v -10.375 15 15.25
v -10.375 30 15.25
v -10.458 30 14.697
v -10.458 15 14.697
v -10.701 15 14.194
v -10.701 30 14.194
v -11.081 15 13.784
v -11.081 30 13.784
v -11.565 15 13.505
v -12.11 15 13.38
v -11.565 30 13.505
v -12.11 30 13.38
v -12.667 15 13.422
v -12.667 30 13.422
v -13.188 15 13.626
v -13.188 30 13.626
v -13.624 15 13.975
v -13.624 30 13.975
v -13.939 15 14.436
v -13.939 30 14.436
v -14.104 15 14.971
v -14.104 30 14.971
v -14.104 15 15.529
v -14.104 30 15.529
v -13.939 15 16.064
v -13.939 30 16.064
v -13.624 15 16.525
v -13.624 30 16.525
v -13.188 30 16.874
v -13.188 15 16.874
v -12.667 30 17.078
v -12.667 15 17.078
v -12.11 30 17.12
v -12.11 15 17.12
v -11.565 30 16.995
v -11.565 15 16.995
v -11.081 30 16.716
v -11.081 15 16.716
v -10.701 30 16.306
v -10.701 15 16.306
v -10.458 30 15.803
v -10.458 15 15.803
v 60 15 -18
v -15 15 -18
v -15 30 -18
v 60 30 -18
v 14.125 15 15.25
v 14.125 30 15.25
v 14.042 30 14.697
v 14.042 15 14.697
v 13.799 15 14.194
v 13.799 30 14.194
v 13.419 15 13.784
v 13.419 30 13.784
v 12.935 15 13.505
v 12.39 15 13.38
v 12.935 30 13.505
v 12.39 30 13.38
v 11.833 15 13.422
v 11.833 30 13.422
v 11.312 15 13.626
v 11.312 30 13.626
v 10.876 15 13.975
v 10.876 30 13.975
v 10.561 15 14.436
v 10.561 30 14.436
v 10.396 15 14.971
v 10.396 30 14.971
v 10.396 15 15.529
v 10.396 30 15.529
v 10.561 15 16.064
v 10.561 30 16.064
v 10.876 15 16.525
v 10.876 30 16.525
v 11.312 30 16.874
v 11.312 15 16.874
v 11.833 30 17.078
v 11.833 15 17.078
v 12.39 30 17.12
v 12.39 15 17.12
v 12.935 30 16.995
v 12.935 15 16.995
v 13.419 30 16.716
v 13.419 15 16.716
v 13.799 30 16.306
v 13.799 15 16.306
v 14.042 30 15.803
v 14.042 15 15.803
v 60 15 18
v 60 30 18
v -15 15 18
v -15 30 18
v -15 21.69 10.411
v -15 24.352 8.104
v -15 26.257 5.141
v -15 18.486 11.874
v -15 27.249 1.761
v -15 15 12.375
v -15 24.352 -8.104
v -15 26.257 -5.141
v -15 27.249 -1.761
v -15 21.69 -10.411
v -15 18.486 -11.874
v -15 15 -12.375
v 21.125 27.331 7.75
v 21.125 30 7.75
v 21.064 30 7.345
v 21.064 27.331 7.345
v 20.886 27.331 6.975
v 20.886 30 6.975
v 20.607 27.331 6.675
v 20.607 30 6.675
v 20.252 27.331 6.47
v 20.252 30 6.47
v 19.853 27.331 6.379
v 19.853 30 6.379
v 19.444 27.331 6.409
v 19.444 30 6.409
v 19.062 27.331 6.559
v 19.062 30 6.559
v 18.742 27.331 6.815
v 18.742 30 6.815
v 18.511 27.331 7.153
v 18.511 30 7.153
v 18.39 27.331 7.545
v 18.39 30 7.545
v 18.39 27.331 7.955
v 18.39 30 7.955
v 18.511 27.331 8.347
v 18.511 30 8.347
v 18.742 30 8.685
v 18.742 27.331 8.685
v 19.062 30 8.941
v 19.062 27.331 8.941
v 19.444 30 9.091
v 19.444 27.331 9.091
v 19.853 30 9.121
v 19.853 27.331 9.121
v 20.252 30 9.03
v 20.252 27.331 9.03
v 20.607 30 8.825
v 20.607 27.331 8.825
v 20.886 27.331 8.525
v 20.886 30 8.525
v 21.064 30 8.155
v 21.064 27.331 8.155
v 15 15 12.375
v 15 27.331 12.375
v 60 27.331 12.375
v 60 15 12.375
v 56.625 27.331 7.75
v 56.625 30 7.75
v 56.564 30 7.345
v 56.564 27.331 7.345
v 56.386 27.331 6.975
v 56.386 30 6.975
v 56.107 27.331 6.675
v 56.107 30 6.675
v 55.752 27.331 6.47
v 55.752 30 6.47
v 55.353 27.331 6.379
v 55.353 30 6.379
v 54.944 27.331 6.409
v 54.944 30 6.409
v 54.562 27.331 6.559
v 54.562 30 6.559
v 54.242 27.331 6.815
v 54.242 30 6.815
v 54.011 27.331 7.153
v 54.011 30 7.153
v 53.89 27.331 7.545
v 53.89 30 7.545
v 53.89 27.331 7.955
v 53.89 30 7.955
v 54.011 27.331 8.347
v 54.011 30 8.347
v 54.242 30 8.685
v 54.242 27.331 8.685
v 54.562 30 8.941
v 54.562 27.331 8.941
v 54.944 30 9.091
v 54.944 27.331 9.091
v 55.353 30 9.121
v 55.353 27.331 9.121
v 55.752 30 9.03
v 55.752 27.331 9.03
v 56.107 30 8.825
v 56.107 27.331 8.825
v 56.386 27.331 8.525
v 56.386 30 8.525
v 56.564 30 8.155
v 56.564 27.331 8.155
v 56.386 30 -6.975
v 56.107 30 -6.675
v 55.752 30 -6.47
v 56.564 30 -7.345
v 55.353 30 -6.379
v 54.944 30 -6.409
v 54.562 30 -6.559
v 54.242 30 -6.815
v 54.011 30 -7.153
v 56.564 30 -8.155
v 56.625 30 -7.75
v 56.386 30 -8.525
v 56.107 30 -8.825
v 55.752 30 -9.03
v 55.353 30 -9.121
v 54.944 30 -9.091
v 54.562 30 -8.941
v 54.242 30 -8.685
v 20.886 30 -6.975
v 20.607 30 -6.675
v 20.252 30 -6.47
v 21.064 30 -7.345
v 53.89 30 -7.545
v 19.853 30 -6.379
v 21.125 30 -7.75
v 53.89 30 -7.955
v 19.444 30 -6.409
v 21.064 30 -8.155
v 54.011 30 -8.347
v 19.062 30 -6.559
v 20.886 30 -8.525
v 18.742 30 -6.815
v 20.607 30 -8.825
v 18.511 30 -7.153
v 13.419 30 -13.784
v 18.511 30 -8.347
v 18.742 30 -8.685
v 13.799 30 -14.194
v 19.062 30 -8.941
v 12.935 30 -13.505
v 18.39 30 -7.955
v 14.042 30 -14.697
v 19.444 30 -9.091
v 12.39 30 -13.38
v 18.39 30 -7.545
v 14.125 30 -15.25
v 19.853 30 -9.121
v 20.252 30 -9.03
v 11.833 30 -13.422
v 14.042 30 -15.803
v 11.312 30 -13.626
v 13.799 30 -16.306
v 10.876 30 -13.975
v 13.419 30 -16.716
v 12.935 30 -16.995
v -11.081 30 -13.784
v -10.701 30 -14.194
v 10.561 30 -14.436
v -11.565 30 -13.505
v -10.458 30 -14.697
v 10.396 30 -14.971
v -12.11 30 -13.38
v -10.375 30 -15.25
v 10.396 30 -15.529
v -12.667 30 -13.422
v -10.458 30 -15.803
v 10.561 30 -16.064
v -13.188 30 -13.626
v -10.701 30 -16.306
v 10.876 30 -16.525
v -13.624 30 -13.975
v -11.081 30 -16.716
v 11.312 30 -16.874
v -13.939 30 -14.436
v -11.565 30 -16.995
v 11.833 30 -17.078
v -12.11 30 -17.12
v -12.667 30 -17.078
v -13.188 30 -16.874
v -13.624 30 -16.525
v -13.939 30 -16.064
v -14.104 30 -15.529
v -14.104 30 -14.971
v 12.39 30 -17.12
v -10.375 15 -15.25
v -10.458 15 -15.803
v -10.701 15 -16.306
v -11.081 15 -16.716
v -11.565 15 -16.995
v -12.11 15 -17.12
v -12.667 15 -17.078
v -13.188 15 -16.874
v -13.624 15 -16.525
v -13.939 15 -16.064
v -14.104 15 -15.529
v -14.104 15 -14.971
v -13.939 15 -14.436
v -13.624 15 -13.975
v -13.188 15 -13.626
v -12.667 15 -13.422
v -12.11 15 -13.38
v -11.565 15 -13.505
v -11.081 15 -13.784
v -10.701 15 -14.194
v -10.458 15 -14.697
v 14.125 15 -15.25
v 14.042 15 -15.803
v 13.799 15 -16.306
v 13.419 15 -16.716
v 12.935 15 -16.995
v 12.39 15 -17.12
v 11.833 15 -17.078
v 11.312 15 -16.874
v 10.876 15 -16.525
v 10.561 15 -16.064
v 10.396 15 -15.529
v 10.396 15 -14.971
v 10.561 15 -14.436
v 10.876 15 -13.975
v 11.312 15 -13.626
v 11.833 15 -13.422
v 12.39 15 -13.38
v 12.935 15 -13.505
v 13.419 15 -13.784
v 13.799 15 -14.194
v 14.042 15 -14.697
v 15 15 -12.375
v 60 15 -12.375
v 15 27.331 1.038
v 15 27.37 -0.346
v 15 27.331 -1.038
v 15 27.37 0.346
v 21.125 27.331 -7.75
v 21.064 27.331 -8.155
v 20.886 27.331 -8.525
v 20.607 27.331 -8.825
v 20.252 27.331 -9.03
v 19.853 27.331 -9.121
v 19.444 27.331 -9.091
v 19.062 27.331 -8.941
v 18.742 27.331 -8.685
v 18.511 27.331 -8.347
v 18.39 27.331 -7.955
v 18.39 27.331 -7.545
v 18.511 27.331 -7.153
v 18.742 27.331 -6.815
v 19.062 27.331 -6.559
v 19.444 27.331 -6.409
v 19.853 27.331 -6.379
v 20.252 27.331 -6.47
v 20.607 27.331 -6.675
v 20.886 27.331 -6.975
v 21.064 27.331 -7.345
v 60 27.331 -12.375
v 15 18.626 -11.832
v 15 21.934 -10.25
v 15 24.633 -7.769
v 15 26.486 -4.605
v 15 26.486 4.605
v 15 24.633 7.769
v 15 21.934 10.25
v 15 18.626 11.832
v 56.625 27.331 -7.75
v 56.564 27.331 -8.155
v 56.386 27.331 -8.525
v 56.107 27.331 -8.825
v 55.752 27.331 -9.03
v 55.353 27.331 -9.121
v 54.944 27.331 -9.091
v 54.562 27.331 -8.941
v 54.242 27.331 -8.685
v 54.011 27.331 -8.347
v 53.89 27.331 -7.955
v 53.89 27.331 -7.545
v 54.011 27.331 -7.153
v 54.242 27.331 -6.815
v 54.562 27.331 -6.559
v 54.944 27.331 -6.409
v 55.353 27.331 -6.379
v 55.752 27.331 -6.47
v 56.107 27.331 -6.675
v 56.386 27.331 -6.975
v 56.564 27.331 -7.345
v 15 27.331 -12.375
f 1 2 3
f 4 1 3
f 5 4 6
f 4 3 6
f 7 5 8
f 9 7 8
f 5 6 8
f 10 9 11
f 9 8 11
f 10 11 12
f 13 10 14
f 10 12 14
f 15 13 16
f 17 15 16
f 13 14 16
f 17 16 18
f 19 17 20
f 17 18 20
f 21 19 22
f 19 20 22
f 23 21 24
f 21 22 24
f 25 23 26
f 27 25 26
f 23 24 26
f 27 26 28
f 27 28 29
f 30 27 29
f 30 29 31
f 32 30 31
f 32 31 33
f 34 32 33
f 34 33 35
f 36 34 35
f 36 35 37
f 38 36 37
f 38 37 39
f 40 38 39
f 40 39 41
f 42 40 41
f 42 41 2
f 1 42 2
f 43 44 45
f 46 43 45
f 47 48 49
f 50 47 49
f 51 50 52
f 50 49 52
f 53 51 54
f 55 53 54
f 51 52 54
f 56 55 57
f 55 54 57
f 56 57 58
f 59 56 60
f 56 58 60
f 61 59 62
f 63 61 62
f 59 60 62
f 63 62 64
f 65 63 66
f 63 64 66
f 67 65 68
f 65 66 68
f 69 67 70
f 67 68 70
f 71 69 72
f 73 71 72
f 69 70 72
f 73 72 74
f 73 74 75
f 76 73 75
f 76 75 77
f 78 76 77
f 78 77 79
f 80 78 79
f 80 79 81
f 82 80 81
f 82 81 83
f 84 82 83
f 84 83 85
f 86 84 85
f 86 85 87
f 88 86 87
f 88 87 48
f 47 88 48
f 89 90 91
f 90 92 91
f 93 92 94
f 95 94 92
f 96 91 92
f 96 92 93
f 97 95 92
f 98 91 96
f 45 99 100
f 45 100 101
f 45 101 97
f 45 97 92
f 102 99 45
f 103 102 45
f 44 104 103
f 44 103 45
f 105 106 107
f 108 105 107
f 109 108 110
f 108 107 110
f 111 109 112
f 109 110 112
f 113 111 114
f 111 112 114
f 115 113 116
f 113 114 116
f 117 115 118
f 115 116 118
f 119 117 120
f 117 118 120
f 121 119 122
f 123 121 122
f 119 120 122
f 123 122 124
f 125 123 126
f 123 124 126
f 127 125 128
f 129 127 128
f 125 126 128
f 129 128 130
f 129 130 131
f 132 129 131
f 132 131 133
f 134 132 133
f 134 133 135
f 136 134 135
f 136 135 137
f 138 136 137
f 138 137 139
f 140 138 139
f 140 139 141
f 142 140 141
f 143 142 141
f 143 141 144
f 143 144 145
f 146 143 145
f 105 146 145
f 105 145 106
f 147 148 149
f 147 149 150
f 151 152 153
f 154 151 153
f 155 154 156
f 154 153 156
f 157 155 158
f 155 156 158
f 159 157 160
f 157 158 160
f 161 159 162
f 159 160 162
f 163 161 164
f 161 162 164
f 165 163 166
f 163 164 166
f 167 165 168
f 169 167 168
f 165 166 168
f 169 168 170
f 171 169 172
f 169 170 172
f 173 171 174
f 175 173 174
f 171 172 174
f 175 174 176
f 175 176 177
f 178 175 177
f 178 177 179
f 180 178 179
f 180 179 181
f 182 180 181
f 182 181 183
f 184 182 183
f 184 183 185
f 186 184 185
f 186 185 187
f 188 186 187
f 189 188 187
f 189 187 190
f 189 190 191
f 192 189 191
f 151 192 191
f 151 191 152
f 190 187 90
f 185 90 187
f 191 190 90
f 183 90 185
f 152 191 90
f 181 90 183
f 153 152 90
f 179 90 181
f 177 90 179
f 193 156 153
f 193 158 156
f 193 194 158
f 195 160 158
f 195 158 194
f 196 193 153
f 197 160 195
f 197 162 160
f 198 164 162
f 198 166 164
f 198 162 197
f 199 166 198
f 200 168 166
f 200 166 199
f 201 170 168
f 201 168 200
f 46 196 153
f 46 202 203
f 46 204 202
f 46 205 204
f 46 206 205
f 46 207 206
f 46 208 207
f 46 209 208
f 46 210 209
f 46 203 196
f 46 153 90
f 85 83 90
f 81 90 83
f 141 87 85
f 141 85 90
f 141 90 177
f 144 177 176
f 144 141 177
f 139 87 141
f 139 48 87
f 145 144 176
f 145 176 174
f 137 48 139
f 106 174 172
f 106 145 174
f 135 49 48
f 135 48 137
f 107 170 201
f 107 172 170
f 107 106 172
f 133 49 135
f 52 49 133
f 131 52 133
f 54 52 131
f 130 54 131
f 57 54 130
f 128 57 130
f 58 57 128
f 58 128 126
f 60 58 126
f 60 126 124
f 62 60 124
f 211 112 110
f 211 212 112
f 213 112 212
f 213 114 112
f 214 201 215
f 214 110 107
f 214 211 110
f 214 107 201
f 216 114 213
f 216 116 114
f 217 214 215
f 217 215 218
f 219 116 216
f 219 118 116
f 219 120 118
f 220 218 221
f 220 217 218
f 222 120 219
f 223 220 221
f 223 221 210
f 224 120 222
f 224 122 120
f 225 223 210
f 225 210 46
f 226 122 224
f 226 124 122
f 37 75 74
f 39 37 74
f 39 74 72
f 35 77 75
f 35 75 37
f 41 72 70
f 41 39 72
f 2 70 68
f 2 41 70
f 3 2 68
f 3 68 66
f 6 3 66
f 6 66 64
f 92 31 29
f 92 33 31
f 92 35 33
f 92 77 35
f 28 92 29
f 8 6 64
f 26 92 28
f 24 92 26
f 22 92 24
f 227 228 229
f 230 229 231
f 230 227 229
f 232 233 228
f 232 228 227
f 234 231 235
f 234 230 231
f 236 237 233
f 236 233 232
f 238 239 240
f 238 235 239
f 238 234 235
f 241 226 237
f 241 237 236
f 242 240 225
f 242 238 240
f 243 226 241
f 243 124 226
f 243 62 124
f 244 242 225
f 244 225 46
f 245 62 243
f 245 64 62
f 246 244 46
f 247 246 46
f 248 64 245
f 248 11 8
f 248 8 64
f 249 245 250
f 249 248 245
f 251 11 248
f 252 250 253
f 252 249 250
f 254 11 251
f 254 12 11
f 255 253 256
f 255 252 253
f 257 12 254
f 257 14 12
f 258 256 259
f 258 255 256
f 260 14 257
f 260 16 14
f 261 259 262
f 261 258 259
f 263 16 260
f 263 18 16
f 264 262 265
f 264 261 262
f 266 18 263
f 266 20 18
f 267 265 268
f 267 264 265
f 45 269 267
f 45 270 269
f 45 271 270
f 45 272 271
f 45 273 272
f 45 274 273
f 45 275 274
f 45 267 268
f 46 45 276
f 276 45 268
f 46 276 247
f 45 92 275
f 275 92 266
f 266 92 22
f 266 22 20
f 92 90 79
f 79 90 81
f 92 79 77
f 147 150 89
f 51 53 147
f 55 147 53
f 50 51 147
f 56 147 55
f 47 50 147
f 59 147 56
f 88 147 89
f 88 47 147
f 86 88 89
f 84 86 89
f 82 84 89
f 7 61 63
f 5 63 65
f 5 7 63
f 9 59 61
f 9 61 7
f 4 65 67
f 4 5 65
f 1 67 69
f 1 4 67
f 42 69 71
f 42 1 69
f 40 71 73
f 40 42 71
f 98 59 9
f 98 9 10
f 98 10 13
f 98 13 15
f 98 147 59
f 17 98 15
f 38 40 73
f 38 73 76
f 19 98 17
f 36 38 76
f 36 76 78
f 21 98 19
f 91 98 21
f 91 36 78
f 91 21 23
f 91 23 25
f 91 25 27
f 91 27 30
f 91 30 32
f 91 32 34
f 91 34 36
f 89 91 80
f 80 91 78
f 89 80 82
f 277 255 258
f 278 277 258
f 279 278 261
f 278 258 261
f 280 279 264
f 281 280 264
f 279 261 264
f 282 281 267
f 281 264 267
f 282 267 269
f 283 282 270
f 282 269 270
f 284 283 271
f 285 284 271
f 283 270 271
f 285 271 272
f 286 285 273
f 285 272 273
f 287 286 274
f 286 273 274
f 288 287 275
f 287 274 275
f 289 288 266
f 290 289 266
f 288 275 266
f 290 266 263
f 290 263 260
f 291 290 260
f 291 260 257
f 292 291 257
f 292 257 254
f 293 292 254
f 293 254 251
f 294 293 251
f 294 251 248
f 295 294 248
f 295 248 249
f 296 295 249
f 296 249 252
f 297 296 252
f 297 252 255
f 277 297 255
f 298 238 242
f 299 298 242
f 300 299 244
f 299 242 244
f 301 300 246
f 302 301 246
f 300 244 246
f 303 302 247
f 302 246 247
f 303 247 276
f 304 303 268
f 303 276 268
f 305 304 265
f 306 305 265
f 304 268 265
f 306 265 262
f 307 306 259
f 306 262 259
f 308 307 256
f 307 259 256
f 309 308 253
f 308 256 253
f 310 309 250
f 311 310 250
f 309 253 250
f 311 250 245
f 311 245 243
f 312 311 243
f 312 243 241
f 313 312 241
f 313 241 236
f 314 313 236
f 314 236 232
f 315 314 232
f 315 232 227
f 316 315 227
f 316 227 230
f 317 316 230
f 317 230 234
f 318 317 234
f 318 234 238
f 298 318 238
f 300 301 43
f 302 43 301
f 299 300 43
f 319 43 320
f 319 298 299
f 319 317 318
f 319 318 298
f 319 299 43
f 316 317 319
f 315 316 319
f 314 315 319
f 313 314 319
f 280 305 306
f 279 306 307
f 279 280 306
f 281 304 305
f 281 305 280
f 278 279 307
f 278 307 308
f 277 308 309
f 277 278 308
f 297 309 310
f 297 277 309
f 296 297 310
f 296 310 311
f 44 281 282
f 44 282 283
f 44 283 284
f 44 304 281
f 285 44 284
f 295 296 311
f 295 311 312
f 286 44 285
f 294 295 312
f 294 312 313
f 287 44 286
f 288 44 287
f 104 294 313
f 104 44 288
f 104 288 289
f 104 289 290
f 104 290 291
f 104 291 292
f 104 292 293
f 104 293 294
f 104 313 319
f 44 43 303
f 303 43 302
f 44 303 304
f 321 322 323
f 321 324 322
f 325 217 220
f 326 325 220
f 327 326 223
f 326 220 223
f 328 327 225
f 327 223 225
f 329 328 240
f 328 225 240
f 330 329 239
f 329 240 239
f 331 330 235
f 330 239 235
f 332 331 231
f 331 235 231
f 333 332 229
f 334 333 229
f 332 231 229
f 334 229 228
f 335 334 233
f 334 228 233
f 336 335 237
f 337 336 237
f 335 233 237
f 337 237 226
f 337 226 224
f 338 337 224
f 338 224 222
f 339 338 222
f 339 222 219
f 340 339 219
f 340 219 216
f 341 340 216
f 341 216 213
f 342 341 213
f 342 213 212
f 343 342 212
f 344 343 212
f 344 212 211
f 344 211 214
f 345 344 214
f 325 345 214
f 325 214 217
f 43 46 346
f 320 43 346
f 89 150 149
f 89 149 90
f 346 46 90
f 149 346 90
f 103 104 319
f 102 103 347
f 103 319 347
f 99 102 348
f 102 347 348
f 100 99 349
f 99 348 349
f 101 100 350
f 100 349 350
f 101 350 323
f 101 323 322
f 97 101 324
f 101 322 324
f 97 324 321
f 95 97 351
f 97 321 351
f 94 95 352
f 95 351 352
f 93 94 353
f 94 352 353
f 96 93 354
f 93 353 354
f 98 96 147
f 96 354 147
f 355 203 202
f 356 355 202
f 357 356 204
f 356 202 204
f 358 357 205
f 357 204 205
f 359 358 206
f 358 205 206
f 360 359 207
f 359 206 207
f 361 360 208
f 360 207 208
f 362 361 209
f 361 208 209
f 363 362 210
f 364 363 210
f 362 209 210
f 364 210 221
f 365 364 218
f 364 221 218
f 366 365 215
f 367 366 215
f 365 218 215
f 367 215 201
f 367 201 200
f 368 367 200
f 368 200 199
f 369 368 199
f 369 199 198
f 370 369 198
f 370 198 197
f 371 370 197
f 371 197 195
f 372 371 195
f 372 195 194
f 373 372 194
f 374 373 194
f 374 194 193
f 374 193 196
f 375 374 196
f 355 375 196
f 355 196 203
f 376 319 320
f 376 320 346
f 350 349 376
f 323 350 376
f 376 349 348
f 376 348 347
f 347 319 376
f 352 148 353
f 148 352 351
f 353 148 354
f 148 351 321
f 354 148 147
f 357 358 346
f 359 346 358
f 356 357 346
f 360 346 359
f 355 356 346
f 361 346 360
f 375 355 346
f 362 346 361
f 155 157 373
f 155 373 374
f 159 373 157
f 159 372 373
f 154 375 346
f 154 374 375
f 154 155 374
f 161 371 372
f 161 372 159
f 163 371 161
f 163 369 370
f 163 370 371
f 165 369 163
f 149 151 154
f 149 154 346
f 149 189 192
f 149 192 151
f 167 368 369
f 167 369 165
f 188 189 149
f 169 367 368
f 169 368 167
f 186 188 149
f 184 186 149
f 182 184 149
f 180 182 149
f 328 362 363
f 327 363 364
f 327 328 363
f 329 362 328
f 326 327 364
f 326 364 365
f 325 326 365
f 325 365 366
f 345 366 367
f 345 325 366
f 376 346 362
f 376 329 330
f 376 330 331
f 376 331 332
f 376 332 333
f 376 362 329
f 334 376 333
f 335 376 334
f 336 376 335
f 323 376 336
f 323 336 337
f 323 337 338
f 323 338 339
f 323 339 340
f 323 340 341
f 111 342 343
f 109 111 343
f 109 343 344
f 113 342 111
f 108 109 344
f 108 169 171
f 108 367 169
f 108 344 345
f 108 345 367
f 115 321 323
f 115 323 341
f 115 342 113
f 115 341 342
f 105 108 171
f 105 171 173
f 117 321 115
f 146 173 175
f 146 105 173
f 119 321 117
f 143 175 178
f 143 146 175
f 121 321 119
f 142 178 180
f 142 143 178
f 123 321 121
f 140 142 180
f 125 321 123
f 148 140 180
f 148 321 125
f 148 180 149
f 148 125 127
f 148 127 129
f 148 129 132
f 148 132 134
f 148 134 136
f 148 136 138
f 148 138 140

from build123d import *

# Parameters (mm, degrees)
SKETCH1_W           = 30
SKETCH1_H           = 36
BOSS_EXTRUDE1_DEPTH = 30
SKETCH3_R           = 12.375
CUT_EXTRUDE1_DEPTH  = 40
SKETCH5_R           = 1.875
CUT_EXTRUDE2_DEPTH  = 40
CUT_EXTRUDE3_START  = 15
SKETCH7_W           = 36
SKETCH7_H           = 15
CUT_EXTRUDE3_DEPTH  = 31
BOSS_EXTRUDE2_DEPTH = 45
SKETCH9_R           = 1.375
CUT_EXTRUDE4_DEPTH  = 10


with BuildPart() as part:
    # Sketch1 → Boss-Extrude1 (new body)
    with BuildSketch(Plane(origin=(0, 0, 0), x_dir=(1, 0, 0), z_dir=(0, 1, 0))):
        Rectangle(SKETCH1_W, SKETCH1_H)
    extrude(amount=BOSS_EXTRUDE1_DEPTH)

    # Sketch3 → Cut-Extrude1 (cut)
    with BuildSketch(Plane(origin=(15, 0, 0), x_dir=(0, 0, -1), z_dir=(1, 0, 0))):
        with Locations((0, 15)):
            Circle(SKETCH3_R)
    extrude(amount=-CUT_EXTRUDE1_DEPTH, mode=Mode.SUBTRACT)

    # Sketch5 → Cut-Extrude2 (cut)
    with BuildSketch(Plane(origin=(0, 30, 0), x_dir=(1, 0, 0), z_dir=(0, 1, 0))):
        with Locations((-12.25, 15.25)):
            Circle(SKETCH5_R)
        with Locations((-12.25, -15.25)):
            Circle(SKETCH5_R)
        with Locations((12.25, -15.25)):
            Circle(SKETCH5_R)
        with Locations((12.25, 15.25)):
            Circle(SKETCH5_R)
    extrude(amount=-CUT_EXTRUDE2_DEPTH, mode=Mode.SUBTRACT)

    # Sketch7 → Cut-Extrude3 (cut, through all)
    with BuildSketch(Plane(origin=(0, 0, 0), x_dir=(0, 0, -1), z_dir=(1, 0, 0)).offset(CUT_EXTRUDE3_START)):
        with Locations((0, 7.5)):
            Rectangle(SKETCH7_W, SKETCH7_H)
    extrude(amount=-CUT_EXTRUDE3_DEPTH, mode=Mode.SUBTRACT)

    # Sketch8 → Boss-Extrude2 (add)
    with BuildSketch(Plane(origin=(15, 0, 0), x_dir=(0, 0, -1), z_dir=(1, 0, 0))):
        Polygon((-18, 30), (18, 30), (18, 27.331397605), (18, 15), (12.375, 15), (12.375, 27.331397605), (-12.375, 27.331397605), (-12.375, 15), (-18, 15), (-18, 27.331397605), align=None)
    extrude(amount=BOSS_EXTRUDE2_DEPTH)

    # Sketch9 → Cut-Extrude4 (cut)
    with BuildSketch(Plane(origin=(0, 30, 0), x_dir=(1, 0, 0), z_dir=(0, 1, 0))):
        with Locations((19.75, 7.75)):
            Circle(SKETCH9_R)
        with Locations((19.75, -7.75)):
            Circle(SKETCH9_R)
        with Locations((55.25, -7.75)):
            Circle(SKETCH9_R)
        with Locations((55.25, 7.75)):
            Circle(SKETCH9_R)
    extrude(amount=-CUT_EXTRUDE4_DEPTH, mode=Mode.SUBTRACT)


solid = part.part
